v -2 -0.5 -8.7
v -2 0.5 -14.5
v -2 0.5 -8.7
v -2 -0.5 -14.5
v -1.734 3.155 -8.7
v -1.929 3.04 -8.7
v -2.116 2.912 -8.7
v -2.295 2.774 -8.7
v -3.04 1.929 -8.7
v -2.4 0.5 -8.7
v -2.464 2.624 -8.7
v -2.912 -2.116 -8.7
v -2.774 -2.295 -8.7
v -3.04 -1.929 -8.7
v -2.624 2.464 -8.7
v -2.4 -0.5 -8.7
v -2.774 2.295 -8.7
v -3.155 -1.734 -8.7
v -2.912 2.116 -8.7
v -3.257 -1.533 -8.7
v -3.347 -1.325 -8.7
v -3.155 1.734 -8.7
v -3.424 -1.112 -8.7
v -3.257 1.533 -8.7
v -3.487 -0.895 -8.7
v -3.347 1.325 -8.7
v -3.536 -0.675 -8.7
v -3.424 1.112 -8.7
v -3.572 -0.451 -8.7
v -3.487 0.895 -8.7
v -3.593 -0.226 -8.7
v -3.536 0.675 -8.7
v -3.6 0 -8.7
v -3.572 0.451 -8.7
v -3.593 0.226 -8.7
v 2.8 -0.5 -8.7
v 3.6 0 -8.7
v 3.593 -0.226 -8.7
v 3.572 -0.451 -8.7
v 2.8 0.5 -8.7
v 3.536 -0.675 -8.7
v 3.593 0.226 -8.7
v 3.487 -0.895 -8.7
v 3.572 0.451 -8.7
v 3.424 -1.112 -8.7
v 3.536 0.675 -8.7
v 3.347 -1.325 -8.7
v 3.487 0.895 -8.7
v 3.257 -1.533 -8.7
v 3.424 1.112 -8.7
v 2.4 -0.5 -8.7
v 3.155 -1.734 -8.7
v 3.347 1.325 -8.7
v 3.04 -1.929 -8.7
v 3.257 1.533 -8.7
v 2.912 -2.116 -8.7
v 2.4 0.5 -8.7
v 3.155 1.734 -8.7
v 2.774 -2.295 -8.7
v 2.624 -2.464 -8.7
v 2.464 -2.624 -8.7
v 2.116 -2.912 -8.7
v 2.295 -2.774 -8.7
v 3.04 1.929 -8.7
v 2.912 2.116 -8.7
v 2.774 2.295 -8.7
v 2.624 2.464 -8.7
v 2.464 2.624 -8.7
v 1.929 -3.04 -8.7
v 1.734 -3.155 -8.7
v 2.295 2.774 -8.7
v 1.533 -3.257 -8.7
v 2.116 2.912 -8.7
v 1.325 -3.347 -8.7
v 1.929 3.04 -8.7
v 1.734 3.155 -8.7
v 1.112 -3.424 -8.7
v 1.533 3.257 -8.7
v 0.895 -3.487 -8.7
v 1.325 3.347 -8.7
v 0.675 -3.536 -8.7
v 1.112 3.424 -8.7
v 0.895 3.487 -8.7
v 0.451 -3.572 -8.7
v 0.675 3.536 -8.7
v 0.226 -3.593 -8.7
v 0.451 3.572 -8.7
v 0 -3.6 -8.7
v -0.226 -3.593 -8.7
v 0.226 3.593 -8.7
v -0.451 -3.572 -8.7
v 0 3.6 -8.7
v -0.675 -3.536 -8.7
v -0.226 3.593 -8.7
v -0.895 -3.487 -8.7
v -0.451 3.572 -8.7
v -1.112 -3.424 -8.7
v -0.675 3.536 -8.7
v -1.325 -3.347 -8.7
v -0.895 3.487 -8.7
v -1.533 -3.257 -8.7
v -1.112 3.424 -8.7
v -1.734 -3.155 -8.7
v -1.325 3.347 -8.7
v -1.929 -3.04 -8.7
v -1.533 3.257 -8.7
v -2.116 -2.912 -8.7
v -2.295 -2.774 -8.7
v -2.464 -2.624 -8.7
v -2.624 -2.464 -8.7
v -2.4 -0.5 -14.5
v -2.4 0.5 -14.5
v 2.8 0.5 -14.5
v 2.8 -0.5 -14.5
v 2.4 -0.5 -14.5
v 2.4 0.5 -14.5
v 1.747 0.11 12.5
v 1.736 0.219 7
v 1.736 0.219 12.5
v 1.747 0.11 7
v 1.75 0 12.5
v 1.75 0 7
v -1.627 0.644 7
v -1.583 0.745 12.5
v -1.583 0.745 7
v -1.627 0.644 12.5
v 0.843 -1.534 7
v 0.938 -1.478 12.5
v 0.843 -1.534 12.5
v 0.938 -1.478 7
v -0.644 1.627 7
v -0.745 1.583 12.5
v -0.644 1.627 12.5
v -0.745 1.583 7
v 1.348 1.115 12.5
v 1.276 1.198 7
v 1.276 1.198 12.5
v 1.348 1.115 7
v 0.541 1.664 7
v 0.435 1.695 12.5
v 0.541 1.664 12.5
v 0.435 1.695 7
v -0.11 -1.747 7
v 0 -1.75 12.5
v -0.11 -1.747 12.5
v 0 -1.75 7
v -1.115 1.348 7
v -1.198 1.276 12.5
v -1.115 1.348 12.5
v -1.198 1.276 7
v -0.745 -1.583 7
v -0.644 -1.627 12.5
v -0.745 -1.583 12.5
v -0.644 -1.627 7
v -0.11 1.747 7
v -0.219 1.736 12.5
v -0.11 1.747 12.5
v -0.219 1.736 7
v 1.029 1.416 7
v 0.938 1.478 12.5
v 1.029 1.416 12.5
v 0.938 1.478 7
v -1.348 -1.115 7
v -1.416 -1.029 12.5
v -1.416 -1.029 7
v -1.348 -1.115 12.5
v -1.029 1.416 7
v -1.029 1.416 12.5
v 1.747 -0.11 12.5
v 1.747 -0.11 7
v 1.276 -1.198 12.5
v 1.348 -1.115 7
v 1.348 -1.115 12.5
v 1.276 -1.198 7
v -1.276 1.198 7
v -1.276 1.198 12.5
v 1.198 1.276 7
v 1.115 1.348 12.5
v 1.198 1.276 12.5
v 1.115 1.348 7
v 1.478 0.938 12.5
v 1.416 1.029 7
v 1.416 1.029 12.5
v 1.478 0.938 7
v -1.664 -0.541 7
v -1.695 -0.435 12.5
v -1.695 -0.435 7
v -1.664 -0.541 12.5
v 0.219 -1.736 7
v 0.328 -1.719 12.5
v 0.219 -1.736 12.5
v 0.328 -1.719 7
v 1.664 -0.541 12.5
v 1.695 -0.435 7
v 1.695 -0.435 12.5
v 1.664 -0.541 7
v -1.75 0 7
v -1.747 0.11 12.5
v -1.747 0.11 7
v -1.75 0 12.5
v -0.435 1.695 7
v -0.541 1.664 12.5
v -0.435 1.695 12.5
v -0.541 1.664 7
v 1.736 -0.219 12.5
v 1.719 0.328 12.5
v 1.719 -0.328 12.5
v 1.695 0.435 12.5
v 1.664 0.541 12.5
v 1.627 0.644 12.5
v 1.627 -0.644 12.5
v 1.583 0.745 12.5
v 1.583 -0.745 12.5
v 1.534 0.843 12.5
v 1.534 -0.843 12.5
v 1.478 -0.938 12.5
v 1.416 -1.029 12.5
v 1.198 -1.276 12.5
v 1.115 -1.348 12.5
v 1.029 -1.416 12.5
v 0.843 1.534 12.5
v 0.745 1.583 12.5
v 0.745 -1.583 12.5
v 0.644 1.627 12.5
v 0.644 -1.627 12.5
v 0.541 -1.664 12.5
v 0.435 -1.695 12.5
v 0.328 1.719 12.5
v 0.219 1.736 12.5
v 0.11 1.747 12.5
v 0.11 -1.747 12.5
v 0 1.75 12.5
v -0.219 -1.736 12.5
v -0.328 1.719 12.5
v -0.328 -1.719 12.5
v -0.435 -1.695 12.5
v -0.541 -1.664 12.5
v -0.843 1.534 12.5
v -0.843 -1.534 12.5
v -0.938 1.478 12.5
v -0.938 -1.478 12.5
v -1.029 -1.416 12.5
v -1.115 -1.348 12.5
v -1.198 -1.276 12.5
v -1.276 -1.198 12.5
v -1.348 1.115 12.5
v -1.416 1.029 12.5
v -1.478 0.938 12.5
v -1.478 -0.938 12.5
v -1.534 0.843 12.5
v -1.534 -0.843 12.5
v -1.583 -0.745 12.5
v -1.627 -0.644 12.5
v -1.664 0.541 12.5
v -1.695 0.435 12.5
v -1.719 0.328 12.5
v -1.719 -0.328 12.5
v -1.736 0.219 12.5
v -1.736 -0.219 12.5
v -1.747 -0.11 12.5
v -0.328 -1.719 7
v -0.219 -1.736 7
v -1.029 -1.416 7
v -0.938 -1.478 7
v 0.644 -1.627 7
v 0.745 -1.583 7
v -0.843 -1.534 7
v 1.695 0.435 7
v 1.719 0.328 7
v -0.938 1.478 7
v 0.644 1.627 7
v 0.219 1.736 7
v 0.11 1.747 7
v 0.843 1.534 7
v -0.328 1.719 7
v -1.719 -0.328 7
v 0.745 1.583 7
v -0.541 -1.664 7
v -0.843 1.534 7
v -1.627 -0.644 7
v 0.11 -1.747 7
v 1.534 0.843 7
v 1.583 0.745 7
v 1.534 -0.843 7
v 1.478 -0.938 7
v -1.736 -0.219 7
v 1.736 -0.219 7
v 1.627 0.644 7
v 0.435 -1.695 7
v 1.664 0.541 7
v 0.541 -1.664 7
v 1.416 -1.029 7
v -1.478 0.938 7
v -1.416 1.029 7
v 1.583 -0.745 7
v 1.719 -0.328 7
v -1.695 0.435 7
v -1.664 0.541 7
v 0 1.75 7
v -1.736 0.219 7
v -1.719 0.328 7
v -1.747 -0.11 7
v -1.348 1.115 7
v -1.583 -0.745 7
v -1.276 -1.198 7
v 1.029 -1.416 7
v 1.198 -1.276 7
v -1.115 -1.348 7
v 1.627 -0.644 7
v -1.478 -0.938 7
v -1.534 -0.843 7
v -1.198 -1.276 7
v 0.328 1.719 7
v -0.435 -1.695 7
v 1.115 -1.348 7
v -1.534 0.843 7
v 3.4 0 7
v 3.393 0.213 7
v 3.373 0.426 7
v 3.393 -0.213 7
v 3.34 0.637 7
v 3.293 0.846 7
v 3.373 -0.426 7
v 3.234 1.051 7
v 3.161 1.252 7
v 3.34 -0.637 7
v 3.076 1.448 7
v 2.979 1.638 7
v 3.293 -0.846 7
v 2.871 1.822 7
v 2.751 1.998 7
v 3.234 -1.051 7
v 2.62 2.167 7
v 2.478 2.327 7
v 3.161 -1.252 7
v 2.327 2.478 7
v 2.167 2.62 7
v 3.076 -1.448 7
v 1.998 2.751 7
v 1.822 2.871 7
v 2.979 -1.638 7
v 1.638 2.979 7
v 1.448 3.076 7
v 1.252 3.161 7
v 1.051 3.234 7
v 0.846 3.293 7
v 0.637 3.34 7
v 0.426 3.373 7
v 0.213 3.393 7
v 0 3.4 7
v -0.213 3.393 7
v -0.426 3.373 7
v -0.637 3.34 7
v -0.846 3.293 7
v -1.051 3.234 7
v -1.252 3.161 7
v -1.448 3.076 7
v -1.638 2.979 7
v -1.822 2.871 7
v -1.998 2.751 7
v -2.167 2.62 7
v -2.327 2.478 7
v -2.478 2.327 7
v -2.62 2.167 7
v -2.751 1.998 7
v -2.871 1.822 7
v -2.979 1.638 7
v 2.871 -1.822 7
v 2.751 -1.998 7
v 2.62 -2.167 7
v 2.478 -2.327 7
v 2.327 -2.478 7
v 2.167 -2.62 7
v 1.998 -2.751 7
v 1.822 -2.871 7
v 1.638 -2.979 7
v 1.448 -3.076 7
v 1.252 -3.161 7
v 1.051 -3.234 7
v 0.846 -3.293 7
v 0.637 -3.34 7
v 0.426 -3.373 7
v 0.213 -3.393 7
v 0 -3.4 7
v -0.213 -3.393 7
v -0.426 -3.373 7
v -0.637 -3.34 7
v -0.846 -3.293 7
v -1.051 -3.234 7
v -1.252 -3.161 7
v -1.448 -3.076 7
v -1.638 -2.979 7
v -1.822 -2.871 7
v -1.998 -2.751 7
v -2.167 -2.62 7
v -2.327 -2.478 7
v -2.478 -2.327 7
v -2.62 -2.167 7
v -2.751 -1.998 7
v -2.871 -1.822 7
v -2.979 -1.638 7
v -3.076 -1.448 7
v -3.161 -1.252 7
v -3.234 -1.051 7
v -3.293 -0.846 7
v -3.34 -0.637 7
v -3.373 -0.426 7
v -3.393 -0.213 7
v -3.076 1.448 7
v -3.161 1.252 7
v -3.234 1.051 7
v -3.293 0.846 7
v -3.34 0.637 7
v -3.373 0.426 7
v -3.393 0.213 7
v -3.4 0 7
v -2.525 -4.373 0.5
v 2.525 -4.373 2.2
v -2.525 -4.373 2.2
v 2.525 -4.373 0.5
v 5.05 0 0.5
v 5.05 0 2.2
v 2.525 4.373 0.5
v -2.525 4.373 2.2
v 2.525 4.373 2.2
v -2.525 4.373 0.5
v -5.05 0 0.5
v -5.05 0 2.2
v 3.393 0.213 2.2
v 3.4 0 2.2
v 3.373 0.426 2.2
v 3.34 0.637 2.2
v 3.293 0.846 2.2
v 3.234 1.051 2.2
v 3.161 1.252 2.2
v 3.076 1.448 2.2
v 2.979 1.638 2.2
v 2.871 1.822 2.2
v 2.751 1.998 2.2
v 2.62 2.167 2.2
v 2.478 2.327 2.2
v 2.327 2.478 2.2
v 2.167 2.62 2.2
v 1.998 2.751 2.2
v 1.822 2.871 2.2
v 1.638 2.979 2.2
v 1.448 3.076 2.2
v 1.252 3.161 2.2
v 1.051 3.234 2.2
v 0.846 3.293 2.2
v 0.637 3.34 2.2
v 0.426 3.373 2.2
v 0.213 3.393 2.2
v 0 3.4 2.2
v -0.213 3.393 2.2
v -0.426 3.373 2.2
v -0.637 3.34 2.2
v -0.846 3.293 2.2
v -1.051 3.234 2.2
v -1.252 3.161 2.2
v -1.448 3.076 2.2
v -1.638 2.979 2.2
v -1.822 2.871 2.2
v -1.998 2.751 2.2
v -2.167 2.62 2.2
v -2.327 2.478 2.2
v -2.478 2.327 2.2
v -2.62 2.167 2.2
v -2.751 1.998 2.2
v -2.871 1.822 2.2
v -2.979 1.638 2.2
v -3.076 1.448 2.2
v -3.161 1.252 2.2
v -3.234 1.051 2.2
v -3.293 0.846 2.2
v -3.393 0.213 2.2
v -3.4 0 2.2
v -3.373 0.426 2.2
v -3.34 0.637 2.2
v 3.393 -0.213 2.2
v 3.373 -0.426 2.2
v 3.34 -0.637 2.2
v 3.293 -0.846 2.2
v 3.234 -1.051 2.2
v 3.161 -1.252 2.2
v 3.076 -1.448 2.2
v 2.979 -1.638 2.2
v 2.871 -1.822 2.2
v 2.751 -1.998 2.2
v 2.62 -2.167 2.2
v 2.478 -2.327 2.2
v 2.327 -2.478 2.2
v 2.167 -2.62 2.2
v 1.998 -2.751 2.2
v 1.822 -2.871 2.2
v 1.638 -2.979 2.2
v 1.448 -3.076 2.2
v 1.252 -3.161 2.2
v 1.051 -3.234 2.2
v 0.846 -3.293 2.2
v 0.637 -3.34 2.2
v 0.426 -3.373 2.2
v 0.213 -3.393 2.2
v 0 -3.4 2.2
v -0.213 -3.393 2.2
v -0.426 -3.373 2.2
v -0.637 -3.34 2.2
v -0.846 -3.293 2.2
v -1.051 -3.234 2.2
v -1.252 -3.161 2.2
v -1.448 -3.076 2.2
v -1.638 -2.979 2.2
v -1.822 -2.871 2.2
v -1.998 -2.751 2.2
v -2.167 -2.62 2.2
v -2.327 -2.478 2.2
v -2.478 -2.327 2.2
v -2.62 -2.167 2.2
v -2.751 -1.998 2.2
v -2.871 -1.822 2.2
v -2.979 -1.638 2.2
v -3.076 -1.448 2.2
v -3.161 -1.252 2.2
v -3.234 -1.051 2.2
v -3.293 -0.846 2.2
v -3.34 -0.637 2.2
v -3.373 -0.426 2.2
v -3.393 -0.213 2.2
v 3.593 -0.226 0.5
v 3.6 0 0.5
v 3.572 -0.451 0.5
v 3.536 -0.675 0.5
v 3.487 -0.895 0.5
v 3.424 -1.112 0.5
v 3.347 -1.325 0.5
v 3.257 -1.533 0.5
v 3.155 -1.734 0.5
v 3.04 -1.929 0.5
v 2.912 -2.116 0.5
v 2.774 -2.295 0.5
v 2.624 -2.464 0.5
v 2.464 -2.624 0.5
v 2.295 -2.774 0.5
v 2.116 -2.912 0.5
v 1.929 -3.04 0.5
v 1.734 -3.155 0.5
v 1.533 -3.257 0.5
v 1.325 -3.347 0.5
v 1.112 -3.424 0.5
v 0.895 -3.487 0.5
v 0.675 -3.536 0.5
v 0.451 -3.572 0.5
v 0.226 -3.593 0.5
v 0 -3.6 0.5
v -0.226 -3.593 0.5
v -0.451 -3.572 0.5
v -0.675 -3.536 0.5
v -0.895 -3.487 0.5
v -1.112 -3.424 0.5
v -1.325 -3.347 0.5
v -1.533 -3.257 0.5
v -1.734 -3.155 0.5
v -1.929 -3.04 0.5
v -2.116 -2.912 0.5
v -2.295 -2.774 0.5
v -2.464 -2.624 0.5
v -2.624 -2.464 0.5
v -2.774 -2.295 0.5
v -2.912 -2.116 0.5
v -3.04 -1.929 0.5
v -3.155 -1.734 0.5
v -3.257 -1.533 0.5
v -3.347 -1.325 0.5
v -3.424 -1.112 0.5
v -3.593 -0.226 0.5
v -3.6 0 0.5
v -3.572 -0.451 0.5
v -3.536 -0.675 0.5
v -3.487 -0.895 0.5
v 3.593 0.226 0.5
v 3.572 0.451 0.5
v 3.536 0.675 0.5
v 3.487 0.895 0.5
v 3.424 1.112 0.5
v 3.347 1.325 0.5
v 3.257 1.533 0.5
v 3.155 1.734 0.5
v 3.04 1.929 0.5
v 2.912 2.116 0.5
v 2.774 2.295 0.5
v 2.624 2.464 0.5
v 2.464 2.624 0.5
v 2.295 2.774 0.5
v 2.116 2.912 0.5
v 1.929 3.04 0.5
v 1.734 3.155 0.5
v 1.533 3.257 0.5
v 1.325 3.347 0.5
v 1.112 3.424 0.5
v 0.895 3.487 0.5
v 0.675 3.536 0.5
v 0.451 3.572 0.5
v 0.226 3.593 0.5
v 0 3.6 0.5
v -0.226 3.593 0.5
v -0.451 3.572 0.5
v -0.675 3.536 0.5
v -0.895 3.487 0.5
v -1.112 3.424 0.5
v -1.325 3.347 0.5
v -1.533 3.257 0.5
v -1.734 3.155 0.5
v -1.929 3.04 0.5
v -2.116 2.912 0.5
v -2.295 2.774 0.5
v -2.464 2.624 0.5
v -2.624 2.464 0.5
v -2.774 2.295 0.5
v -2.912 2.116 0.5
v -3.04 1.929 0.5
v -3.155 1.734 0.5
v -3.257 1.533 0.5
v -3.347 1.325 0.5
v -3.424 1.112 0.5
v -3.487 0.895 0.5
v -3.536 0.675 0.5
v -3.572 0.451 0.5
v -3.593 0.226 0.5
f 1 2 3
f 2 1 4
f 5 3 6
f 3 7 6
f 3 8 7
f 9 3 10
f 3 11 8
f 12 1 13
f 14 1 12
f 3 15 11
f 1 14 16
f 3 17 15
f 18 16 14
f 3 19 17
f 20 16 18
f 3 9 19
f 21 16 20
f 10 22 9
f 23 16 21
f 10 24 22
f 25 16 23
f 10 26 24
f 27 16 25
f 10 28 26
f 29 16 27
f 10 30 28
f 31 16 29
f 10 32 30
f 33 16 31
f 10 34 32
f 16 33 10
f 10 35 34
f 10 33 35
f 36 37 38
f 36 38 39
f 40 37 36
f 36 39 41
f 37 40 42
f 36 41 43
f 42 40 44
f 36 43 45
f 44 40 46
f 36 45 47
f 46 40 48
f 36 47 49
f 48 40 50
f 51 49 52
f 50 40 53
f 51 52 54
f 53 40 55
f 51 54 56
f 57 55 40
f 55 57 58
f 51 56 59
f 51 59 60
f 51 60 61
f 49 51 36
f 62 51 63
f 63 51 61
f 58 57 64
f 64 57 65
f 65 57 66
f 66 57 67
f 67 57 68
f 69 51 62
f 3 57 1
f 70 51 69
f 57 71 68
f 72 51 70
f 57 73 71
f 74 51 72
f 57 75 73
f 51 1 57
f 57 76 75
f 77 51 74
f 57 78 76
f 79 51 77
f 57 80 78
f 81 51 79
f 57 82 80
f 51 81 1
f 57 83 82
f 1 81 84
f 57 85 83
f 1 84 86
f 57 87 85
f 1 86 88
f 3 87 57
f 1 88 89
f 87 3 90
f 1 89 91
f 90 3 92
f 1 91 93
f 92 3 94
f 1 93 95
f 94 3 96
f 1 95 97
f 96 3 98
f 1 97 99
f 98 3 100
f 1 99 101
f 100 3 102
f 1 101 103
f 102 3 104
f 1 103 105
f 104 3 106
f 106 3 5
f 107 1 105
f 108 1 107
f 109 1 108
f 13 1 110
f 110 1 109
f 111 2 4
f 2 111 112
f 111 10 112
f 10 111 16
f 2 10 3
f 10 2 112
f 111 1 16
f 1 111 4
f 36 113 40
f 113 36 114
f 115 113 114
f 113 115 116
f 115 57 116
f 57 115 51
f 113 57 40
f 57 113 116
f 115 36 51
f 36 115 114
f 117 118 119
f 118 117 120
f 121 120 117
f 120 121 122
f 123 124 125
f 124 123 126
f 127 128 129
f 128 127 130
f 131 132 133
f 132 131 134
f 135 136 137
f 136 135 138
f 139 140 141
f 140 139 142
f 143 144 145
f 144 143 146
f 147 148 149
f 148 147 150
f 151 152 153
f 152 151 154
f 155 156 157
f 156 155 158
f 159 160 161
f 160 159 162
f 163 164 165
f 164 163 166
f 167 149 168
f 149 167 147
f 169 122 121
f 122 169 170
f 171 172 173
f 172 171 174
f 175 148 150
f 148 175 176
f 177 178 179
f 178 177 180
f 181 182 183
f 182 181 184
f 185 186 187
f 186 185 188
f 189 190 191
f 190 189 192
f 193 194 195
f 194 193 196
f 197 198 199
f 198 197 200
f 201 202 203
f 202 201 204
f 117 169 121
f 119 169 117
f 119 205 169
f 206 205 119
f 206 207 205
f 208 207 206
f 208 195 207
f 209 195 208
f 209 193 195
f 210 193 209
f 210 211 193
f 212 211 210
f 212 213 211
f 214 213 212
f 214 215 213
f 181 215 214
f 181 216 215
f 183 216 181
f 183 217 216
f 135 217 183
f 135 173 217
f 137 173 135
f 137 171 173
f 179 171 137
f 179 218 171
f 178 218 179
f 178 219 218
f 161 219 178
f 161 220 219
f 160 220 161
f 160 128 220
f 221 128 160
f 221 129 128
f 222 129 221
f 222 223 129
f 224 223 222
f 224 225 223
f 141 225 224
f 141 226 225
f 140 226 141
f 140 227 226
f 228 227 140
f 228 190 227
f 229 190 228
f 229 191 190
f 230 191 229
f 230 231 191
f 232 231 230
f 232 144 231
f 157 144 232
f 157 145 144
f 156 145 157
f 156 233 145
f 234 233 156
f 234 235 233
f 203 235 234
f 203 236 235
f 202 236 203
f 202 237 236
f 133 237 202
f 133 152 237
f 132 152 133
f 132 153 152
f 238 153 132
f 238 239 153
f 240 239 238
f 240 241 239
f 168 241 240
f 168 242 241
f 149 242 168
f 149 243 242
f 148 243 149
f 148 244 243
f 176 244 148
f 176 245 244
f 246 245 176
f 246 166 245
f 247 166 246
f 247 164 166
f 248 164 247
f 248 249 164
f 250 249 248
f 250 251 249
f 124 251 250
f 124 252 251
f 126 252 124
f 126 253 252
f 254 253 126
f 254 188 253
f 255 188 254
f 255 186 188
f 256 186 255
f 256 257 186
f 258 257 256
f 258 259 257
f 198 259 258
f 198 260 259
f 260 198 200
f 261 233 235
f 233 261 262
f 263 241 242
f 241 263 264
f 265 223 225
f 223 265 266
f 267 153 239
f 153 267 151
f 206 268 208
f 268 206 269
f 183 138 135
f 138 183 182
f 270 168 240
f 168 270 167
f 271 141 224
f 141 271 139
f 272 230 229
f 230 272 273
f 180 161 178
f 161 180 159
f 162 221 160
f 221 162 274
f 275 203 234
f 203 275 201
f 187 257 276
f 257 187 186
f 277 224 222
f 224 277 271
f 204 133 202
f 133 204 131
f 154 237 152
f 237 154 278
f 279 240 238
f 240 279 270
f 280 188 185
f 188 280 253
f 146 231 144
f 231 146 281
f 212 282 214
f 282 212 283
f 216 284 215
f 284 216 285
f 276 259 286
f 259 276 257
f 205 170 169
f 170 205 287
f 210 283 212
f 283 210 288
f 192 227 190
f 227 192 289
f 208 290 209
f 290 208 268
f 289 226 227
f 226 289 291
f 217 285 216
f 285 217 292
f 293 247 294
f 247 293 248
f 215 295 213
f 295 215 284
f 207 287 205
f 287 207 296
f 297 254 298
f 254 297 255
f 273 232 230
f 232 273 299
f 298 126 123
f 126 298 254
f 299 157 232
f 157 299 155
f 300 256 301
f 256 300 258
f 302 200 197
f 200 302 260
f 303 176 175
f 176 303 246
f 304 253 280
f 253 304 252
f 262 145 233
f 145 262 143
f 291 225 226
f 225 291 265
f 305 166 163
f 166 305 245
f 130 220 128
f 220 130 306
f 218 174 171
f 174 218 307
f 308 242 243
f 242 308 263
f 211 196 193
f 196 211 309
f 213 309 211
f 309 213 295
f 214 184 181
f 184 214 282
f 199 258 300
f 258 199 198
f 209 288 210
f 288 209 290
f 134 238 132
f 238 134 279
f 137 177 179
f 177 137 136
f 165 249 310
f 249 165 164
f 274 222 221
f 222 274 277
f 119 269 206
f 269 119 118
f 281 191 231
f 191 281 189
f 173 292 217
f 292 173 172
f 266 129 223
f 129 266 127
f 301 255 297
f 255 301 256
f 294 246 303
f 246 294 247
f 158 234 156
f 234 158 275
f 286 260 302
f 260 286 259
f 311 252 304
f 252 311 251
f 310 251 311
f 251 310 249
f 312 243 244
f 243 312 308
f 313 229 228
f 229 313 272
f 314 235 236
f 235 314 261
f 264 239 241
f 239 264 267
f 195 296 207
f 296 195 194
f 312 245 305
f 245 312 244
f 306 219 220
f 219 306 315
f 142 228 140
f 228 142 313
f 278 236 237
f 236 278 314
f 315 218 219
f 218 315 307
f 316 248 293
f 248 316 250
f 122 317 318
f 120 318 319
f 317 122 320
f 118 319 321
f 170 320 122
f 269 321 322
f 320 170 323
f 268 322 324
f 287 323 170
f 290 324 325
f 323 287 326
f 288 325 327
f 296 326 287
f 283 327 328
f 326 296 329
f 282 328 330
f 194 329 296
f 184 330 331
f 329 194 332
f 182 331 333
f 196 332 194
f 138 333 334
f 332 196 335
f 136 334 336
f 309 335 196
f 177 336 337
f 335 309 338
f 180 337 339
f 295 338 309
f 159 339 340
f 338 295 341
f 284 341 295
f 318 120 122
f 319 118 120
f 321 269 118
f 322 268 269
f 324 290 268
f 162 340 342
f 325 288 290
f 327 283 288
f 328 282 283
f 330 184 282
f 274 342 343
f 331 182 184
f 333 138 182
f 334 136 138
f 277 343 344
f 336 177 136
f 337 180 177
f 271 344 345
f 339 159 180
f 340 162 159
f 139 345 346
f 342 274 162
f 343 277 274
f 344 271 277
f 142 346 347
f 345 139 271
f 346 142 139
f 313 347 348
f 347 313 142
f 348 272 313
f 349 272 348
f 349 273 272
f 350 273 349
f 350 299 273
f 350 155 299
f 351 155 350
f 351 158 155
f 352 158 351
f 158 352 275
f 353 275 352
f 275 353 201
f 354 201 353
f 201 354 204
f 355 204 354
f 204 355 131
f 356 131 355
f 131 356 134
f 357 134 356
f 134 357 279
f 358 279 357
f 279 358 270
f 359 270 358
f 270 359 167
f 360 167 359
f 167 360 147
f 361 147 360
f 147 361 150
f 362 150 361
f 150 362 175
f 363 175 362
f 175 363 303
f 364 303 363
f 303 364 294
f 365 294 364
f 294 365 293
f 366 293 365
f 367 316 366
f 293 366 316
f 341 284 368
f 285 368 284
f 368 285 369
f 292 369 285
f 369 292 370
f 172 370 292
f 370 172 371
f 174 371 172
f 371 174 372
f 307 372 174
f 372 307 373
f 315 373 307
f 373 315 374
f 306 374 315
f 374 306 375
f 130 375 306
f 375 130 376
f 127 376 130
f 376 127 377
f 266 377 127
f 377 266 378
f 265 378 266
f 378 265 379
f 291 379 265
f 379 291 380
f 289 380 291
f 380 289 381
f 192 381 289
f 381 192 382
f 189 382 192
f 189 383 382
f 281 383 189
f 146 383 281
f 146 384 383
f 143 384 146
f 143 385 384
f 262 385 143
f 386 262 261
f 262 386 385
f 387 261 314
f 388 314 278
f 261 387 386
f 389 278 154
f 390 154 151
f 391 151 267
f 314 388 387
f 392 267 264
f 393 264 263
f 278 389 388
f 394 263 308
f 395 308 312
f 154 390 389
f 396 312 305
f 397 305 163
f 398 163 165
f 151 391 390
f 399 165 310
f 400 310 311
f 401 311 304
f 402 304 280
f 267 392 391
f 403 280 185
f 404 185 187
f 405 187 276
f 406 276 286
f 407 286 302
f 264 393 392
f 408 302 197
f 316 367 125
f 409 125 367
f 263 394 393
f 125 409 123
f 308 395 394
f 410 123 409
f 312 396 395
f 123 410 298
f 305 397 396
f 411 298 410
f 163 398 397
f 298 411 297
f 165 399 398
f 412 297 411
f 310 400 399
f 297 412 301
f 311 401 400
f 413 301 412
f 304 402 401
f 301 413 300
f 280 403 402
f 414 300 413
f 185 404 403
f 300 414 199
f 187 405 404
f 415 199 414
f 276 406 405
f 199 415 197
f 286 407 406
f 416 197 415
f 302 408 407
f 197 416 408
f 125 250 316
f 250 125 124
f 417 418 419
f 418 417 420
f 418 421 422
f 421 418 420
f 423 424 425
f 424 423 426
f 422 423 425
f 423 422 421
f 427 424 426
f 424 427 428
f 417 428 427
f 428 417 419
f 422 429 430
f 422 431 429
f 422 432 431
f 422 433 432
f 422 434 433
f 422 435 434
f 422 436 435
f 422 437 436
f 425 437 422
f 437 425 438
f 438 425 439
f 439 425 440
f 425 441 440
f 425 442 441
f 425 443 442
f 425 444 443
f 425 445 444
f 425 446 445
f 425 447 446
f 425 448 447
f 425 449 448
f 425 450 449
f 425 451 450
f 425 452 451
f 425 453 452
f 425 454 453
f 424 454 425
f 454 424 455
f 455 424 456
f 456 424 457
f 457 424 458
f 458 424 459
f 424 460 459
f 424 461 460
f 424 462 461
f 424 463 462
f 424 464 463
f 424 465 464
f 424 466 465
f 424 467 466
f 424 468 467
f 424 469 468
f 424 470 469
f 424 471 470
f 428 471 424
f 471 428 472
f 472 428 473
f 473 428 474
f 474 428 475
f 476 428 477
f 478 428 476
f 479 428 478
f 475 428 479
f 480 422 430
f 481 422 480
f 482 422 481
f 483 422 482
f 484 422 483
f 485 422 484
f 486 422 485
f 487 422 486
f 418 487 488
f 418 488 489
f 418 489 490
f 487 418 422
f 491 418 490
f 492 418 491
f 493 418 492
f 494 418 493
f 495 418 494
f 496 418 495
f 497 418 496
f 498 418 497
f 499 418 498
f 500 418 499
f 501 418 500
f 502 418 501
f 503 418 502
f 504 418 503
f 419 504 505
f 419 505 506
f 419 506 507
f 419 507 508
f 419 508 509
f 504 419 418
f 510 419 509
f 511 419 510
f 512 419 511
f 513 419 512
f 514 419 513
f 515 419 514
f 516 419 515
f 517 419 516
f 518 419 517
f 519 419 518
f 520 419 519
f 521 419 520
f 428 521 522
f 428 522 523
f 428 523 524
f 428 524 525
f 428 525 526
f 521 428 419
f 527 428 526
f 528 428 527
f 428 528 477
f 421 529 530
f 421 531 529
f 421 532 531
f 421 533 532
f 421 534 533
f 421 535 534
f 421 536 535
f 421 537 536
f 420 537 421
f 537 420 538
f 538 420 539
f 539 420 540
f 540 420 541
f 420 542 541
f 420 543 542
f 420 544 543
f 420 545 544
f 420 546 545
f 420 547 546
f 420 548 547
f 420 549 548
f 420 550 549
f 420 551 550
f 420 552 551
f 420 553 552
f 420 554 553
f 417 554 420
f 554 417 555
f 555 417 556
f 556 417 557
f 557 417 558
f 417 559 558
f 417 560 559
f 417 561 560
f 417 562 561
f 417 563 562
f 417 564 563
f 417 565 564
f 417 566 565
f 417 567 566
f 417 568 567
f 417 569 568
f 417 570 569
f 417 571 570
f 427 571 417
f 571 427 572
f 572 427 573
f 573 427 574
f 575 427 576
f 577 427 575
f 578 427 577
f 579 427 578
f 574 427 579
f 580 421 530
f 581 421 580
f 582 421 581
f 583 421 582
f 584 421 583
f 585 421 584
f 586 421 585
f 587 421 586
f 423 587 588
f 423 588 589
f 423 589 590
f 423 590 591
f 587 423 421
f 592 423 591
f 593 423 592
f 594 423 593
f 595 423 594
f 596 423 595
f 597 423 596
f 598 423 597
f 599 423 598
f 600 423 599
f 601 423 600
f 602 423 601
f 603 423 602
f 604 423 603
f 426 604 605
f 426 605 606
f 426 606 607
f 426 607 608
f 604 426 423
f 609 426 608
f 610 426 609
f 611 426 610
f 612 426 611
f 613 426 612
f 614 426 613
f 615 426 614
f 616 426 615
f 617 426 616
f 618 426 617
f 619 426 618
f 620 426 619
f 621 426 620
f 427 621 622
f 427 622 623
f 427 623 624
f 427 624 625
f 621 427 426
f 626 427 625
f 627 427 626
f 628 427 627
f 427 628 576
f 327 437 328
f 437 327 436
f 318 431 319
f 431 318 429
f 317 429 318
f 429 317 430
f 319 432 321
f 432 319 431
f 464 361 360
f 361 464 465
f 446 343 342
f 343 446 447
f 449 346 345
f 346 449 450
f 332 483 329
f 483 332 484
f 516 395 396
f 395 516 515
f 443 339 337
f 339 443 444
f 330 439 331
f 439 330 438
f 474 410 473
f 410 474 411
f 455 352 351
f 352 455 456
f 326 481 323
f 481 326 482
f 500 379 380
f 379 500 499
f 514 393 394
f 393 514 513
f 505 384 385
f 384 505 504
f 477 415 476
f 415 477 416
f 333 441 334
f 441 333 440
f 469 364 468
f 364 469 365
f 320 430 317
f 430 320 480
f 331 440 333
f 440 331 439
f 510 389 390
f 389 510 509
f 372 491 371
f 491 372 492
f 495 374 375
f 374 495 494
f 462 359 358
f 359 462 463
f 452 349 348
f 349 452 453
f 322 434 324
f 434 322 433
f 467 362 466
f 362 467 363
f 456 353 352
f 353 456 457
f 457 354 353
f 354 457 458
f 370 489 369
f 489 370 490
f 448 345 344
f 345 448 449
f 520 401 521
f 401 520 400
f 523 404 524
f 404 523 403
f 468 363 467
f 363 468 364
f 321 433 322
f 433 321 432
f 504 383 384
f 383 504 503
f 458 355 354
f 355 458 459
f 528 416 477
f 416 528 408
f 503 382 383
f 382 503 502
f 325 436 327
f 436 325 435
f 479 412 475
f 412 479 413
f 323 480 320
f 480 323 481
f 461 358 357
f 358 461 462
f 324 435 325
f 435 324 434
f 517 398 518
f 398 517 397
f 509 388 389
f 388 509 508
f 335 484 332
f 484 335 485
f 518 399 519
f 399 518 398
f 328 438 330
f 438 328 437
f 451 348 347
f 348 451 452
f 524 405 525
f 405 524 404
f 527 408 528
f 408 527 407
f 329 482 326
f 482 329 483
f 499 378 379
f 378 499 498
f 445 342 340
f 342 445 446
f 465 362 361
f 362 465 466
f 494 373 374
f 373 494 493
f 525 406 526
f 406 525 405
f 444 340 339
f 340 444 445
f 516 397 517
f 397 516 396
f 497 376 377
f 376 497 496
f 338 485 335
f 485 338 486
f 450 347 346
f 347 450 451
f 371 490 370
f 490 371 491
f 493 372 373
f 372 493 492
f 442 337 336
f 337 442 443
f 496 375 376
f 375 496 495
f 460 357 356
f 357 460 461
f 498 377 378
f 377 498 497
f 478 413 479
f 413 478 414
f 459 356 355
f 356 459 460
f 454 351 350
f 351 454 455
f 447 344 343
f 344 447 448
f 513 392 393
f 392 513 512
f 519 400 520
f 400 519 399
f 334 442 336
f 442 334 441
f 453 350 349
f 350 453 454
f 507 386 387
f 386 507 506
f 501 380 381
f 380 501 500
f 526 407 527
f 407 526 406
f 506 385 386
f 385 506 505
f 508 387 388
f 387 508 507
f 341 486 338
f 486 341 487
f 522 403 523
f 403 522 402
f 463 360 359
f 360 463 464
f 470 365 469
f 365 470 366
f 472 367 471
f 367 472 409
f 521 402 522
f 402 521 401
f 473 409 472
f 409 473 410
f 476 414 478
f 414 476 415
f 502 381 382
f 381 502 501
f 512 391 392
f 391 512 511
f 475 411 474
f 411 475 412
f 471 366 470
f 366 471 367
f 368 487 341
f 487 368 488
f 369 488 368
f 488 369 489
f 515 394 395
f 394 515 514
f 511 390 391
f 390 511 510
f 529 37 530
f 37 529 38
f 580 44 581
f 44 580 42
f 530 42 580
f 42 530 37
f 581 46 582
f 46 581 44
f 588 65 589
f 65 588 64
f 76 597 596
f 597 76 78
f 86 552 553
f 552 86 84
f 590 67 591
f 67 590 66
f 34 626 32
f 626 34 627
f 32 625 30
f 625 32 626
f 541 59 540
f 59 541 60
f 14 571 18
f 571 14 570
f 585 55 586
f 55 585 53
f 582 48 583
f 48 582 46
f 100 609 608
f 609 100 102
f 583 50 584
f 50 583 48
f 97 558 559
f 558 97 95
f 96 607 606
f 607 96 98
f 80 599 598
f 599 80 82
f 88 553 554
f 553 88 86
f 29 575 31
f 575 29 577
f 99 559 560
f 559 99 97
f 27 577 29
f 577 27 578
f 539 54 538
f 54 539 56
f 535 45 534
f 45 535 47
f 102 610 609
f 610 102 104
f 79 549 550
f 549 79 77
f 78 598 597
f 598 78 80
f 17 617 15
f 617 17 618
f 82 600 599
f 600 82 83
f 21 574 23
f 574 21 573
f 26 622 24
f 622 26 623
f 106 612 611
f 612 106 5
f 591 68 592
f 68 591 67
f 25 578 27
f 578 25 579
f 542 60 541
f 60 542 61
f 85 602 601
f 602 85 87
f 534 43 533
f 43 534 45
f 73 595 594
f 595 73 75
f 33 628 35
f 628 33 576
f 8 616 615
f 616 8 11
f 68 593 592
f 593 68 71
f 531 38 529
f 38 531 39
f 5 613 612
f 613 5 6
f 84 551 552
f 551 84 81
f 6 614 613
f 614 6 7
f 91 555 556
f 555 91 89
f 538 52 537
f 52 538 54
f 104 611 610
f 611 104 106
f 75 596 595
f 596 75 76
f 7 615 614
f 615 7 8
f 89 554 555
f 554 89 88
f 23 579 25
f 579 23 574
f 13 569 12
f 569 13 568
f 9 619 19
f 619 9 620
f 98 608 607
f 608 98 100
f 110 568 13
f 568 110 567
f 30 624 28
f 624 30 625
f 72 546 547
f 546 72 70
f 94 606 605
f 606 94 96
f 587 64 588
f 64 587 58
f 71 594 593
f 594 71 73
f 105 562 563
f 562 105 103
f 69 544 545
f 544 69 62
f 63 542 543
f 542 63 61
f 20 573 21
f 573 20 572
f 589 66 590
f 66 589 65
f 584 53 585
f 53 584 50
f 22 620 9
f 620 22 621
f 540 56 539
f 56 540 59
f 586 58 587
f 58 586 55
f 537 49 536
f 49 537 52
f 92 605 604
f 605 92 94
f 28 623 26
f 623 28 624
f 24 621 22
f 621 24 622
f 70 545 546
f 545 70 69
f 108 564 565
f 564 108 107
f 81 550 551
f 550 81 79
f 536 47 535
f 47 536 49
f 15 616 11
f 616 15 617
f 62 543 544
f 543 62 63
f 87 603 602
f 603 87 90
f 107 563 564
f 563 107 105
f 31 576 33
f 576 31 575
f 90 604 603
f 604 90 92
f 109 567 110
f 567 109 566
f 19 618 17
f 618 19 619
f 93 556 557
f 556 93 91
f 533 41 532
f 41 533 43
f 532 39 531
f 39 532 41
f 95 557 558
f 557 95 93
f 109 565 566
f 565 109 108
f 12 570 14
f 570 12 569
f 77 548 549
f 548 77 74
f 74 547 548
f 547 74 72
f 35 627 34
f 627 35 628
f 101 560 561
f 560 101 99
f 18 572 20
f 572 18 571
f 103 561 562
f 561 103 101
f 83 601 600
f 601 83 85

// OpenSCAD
module Button() {
    
    {
        translate([0 , 0 , 7])
        cylinder(  5.5,   d=3.5, true,$fn=100);
         
        translate([0 , 0 , 0.5])
        cylinder(  1.7,   d=10.1, true,$fn=6);
        

        
        translate([0 , 0 , -8.7])
        cylinder(  15.7,   d=6.8, true,$fn=100);
        
        for (i = [0, 4.8]) {
            translate([-2.4+i, -1/2, -8.7-5.8])
            cube([0.4, 1, 5.8]);

            
        }
    }
    
};

module ButtonHole(clearence = 0.2) {

    translate([0 , 0 , -8.7])
     cylinder(  9.4,   d=6.8+clearence*2, true,$fn=100);
};

Button();
ButtonHole();
